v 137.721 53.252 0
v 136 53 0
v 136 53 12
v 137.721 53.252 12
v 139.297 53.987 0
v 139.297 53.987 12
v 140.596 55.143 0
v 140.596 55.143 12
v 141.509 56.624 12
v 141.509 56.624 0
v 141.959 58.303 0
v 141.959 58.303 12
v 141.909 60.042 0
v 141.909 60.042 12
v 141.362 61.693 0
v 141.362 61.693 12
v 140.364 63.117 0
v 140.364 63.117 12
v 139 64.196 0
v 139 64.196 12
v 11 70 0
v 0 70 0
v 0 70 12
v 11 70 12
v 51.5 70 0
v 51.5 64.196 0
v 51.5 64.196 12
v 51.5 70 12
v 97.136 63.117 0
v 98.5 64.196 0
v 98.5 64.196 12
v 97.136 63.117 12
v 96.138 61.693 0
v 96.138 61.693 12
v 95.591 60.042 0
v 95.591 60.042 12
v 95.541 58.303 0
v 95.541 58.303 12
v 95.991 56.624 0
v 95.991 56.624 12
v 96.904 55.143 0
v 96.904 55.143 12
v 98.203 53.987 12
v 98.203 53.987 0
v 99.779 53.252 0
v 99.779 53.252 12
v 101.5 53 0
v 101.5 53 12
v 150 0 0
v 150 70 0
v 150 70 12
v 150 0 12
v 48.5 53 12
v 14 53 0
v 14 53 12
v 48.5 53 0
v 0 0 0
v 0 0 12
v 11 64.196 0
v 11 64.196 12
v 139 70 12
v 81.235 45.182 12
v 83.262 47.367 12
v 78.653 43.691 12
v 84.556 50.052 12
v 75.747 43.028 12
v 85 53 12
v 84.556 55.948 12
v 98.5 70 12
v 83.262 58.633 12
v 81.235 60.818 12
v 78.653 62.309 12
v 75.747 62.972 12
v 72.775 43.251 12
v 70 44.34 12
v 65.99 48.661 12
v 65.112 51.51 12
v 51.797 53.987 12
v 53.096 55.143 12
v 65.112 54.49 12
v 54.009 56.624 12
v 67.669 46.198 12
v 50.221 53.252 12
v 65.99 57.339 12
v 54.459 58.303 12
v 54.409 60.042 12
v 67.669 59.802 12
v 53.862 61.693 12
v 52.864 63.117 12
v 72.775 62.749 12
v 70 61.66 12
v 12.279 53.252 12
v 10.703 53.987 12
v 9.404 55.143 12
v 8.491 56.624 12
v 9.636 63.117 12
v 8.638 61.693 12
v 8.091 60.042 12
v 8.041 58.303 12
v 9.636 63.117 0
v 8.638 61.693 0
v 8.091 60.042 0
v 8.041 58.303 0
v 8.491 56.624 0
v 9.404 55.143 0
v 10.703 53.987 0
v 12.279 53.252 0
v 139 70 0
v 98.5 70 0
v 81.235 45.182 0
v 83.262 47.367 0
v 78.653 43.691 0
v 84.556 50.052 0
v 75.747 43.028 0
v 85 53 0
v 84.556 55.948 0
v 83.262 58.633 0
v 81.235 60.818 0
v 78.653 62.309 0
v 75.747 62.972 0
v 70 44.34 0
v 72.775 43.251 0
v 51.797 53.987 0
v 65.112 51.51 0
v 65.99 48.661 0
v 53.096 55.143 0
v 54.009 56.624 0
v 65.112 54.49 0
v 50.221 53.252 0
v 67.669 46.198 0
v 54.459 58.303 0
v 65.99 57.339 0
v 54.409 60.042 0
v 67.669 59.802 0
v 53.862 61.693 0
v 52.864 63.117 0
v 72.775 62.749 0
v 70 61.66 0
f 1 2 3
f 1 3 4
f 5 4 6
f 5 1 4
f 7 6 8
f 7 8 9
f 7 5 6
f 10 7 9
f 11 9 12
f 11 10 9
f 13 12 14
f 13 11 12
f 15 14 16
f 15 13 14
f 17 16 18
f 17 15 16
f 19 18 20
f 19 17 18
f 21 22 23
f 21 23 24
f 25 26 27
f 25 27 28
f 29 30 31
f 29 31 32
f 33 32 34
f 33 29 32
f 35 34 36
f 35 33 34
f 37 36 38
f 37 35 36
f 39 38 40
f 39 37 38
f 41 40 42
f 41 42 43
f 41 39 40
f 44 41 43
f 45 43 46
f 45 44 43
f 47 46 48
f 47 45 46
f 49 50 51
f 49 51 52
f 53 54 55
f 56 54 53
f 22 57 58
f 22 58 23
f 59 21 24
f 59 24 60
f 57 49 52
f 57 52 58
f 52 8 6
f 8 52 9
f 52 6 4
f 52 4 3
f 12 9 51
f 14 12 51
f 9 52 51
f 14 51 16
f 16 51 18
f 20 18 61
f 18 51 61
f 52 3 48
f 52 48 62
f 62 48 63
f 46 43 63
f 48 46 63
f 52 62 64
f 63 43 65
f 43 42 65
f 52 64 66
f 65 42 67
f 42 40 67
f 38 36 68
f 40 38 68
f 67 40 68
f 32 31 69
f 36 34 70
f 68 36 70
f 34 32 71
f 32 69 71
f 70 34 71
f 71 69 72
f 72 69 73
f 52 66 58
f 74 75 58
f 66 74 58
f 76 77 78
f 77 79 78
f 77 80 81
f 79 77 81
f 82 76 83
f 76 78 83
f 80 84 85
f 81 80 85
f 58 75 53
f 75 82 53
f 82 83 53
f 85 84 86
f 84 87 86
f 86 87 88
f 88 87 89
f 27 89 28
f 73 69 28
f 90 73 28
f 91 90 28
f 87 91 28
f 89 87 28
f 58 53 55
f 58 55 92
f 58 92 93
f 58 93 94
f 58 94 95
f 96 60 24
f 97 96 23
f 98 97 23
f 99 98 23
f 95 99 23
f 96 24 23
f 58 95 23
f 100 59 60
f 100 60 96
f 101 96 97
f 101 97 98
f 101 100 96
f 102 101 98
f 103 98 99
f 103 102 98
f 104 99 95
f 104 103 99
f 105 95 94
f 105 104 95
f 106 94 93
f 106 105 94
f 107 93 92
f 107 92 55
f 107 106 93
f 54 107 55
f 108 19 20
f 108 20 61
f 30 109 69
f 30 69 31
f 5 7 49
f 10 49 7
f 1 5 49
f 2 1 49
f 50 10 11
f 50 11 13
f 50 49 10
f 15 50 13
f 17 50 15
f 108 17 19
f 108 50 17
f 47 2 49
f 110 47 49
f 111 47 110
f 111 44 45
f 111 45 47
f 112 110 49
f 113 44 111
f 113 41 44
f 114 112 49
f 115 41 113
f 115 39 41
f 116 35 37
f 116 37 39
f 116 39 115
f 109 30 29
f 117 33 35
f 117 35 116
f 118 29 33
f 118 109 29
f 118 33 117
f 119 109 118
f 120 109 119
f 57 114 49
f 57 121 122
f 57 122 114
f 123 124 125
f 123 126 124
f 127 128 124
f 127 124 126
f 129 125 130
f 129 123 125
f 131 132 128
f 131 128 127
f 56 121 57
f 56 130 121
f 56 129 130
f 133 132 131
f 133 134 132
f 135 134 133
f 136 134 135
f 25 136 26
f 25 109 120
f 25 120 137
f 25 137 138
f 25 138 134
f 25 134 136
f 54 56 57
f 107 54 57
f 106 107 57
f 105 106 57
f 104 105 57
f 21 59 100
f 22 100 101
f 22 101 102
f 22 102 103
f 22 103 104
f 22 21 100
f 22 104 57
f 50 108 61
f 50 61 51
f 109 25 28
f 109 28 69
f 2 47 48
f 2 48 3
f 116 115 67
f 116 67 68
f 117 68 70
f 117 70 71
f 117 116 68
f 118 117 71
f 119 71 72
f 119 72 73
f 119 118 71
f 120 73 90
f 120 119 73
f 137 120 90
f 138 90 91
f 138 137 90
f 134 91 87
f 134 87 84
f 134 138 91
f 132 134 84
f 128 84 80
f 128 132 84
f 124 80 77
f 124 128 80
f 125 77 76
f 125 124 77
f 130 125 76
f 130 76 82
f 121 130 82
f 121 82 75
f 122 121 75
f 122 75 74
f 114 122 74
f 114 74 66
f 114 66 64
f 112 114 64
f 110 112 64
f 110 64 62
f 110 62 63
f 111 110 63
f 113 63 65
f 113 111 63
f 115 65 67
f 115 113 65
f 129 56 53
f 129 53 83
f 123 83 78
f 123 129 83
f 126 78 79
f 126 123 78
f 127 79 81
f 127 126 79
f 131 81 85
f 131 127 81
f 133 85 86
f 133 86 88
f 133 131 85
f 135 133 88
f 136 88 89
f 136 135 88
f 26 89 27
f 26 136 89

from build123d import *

# Parameters (mm, degrees)
CROQUIS1_R              = 10
SALIENTE_EXTRUIR1_DEPTH = 12


with BuildPart() as part:
    # Croquis1 → Saliente-Extruir1 (new body)
    with BuildSketch(Plane.XY):
        with BuildLine():
            Line((0, 0), (0, 70))
            Line((0, 70), (11, 70))
            Line((11, 70), (11, 64.196152423))
            ThreePointArc((11, 64.196152423), (8.204445042, 57.447085729), (14, 53))
            Line((14, 53), (48.5, 53))
            ThreePointArc((48.5, 53), (54.295554958, 57.447085729), (51.5, 64.196152423))
            Line((51.5, 64.196152423), (51.5, 70))
            Line((51.5, 70), (98.5, 70))
            Line((98.5, 70), (98.5, 64.196152423))
            ThreePointArc((98.5, 64.196152423), (95.704445042, 57.447085729), (101.5, 53))
            Line((101.5, 53), (136, 53))
            ThreePointArc((136, 53), (141.795554958, 57.447085729), (139, 64.196152423))
            Line((139, 64.196152423), (139, 70))
            Line((139, 70), (150, 70))
            Line((150, 70), (150, 0))
            Line((150, 0), (0, 0))
        make_face()
        with Locations((75, 53)):
            Circle(CROQUIS1_R, mode=Mode.SUBTRACT)
    extrude(amount=SALIENTE_EXTRUIR1_DEPTH)


solid = part.part
